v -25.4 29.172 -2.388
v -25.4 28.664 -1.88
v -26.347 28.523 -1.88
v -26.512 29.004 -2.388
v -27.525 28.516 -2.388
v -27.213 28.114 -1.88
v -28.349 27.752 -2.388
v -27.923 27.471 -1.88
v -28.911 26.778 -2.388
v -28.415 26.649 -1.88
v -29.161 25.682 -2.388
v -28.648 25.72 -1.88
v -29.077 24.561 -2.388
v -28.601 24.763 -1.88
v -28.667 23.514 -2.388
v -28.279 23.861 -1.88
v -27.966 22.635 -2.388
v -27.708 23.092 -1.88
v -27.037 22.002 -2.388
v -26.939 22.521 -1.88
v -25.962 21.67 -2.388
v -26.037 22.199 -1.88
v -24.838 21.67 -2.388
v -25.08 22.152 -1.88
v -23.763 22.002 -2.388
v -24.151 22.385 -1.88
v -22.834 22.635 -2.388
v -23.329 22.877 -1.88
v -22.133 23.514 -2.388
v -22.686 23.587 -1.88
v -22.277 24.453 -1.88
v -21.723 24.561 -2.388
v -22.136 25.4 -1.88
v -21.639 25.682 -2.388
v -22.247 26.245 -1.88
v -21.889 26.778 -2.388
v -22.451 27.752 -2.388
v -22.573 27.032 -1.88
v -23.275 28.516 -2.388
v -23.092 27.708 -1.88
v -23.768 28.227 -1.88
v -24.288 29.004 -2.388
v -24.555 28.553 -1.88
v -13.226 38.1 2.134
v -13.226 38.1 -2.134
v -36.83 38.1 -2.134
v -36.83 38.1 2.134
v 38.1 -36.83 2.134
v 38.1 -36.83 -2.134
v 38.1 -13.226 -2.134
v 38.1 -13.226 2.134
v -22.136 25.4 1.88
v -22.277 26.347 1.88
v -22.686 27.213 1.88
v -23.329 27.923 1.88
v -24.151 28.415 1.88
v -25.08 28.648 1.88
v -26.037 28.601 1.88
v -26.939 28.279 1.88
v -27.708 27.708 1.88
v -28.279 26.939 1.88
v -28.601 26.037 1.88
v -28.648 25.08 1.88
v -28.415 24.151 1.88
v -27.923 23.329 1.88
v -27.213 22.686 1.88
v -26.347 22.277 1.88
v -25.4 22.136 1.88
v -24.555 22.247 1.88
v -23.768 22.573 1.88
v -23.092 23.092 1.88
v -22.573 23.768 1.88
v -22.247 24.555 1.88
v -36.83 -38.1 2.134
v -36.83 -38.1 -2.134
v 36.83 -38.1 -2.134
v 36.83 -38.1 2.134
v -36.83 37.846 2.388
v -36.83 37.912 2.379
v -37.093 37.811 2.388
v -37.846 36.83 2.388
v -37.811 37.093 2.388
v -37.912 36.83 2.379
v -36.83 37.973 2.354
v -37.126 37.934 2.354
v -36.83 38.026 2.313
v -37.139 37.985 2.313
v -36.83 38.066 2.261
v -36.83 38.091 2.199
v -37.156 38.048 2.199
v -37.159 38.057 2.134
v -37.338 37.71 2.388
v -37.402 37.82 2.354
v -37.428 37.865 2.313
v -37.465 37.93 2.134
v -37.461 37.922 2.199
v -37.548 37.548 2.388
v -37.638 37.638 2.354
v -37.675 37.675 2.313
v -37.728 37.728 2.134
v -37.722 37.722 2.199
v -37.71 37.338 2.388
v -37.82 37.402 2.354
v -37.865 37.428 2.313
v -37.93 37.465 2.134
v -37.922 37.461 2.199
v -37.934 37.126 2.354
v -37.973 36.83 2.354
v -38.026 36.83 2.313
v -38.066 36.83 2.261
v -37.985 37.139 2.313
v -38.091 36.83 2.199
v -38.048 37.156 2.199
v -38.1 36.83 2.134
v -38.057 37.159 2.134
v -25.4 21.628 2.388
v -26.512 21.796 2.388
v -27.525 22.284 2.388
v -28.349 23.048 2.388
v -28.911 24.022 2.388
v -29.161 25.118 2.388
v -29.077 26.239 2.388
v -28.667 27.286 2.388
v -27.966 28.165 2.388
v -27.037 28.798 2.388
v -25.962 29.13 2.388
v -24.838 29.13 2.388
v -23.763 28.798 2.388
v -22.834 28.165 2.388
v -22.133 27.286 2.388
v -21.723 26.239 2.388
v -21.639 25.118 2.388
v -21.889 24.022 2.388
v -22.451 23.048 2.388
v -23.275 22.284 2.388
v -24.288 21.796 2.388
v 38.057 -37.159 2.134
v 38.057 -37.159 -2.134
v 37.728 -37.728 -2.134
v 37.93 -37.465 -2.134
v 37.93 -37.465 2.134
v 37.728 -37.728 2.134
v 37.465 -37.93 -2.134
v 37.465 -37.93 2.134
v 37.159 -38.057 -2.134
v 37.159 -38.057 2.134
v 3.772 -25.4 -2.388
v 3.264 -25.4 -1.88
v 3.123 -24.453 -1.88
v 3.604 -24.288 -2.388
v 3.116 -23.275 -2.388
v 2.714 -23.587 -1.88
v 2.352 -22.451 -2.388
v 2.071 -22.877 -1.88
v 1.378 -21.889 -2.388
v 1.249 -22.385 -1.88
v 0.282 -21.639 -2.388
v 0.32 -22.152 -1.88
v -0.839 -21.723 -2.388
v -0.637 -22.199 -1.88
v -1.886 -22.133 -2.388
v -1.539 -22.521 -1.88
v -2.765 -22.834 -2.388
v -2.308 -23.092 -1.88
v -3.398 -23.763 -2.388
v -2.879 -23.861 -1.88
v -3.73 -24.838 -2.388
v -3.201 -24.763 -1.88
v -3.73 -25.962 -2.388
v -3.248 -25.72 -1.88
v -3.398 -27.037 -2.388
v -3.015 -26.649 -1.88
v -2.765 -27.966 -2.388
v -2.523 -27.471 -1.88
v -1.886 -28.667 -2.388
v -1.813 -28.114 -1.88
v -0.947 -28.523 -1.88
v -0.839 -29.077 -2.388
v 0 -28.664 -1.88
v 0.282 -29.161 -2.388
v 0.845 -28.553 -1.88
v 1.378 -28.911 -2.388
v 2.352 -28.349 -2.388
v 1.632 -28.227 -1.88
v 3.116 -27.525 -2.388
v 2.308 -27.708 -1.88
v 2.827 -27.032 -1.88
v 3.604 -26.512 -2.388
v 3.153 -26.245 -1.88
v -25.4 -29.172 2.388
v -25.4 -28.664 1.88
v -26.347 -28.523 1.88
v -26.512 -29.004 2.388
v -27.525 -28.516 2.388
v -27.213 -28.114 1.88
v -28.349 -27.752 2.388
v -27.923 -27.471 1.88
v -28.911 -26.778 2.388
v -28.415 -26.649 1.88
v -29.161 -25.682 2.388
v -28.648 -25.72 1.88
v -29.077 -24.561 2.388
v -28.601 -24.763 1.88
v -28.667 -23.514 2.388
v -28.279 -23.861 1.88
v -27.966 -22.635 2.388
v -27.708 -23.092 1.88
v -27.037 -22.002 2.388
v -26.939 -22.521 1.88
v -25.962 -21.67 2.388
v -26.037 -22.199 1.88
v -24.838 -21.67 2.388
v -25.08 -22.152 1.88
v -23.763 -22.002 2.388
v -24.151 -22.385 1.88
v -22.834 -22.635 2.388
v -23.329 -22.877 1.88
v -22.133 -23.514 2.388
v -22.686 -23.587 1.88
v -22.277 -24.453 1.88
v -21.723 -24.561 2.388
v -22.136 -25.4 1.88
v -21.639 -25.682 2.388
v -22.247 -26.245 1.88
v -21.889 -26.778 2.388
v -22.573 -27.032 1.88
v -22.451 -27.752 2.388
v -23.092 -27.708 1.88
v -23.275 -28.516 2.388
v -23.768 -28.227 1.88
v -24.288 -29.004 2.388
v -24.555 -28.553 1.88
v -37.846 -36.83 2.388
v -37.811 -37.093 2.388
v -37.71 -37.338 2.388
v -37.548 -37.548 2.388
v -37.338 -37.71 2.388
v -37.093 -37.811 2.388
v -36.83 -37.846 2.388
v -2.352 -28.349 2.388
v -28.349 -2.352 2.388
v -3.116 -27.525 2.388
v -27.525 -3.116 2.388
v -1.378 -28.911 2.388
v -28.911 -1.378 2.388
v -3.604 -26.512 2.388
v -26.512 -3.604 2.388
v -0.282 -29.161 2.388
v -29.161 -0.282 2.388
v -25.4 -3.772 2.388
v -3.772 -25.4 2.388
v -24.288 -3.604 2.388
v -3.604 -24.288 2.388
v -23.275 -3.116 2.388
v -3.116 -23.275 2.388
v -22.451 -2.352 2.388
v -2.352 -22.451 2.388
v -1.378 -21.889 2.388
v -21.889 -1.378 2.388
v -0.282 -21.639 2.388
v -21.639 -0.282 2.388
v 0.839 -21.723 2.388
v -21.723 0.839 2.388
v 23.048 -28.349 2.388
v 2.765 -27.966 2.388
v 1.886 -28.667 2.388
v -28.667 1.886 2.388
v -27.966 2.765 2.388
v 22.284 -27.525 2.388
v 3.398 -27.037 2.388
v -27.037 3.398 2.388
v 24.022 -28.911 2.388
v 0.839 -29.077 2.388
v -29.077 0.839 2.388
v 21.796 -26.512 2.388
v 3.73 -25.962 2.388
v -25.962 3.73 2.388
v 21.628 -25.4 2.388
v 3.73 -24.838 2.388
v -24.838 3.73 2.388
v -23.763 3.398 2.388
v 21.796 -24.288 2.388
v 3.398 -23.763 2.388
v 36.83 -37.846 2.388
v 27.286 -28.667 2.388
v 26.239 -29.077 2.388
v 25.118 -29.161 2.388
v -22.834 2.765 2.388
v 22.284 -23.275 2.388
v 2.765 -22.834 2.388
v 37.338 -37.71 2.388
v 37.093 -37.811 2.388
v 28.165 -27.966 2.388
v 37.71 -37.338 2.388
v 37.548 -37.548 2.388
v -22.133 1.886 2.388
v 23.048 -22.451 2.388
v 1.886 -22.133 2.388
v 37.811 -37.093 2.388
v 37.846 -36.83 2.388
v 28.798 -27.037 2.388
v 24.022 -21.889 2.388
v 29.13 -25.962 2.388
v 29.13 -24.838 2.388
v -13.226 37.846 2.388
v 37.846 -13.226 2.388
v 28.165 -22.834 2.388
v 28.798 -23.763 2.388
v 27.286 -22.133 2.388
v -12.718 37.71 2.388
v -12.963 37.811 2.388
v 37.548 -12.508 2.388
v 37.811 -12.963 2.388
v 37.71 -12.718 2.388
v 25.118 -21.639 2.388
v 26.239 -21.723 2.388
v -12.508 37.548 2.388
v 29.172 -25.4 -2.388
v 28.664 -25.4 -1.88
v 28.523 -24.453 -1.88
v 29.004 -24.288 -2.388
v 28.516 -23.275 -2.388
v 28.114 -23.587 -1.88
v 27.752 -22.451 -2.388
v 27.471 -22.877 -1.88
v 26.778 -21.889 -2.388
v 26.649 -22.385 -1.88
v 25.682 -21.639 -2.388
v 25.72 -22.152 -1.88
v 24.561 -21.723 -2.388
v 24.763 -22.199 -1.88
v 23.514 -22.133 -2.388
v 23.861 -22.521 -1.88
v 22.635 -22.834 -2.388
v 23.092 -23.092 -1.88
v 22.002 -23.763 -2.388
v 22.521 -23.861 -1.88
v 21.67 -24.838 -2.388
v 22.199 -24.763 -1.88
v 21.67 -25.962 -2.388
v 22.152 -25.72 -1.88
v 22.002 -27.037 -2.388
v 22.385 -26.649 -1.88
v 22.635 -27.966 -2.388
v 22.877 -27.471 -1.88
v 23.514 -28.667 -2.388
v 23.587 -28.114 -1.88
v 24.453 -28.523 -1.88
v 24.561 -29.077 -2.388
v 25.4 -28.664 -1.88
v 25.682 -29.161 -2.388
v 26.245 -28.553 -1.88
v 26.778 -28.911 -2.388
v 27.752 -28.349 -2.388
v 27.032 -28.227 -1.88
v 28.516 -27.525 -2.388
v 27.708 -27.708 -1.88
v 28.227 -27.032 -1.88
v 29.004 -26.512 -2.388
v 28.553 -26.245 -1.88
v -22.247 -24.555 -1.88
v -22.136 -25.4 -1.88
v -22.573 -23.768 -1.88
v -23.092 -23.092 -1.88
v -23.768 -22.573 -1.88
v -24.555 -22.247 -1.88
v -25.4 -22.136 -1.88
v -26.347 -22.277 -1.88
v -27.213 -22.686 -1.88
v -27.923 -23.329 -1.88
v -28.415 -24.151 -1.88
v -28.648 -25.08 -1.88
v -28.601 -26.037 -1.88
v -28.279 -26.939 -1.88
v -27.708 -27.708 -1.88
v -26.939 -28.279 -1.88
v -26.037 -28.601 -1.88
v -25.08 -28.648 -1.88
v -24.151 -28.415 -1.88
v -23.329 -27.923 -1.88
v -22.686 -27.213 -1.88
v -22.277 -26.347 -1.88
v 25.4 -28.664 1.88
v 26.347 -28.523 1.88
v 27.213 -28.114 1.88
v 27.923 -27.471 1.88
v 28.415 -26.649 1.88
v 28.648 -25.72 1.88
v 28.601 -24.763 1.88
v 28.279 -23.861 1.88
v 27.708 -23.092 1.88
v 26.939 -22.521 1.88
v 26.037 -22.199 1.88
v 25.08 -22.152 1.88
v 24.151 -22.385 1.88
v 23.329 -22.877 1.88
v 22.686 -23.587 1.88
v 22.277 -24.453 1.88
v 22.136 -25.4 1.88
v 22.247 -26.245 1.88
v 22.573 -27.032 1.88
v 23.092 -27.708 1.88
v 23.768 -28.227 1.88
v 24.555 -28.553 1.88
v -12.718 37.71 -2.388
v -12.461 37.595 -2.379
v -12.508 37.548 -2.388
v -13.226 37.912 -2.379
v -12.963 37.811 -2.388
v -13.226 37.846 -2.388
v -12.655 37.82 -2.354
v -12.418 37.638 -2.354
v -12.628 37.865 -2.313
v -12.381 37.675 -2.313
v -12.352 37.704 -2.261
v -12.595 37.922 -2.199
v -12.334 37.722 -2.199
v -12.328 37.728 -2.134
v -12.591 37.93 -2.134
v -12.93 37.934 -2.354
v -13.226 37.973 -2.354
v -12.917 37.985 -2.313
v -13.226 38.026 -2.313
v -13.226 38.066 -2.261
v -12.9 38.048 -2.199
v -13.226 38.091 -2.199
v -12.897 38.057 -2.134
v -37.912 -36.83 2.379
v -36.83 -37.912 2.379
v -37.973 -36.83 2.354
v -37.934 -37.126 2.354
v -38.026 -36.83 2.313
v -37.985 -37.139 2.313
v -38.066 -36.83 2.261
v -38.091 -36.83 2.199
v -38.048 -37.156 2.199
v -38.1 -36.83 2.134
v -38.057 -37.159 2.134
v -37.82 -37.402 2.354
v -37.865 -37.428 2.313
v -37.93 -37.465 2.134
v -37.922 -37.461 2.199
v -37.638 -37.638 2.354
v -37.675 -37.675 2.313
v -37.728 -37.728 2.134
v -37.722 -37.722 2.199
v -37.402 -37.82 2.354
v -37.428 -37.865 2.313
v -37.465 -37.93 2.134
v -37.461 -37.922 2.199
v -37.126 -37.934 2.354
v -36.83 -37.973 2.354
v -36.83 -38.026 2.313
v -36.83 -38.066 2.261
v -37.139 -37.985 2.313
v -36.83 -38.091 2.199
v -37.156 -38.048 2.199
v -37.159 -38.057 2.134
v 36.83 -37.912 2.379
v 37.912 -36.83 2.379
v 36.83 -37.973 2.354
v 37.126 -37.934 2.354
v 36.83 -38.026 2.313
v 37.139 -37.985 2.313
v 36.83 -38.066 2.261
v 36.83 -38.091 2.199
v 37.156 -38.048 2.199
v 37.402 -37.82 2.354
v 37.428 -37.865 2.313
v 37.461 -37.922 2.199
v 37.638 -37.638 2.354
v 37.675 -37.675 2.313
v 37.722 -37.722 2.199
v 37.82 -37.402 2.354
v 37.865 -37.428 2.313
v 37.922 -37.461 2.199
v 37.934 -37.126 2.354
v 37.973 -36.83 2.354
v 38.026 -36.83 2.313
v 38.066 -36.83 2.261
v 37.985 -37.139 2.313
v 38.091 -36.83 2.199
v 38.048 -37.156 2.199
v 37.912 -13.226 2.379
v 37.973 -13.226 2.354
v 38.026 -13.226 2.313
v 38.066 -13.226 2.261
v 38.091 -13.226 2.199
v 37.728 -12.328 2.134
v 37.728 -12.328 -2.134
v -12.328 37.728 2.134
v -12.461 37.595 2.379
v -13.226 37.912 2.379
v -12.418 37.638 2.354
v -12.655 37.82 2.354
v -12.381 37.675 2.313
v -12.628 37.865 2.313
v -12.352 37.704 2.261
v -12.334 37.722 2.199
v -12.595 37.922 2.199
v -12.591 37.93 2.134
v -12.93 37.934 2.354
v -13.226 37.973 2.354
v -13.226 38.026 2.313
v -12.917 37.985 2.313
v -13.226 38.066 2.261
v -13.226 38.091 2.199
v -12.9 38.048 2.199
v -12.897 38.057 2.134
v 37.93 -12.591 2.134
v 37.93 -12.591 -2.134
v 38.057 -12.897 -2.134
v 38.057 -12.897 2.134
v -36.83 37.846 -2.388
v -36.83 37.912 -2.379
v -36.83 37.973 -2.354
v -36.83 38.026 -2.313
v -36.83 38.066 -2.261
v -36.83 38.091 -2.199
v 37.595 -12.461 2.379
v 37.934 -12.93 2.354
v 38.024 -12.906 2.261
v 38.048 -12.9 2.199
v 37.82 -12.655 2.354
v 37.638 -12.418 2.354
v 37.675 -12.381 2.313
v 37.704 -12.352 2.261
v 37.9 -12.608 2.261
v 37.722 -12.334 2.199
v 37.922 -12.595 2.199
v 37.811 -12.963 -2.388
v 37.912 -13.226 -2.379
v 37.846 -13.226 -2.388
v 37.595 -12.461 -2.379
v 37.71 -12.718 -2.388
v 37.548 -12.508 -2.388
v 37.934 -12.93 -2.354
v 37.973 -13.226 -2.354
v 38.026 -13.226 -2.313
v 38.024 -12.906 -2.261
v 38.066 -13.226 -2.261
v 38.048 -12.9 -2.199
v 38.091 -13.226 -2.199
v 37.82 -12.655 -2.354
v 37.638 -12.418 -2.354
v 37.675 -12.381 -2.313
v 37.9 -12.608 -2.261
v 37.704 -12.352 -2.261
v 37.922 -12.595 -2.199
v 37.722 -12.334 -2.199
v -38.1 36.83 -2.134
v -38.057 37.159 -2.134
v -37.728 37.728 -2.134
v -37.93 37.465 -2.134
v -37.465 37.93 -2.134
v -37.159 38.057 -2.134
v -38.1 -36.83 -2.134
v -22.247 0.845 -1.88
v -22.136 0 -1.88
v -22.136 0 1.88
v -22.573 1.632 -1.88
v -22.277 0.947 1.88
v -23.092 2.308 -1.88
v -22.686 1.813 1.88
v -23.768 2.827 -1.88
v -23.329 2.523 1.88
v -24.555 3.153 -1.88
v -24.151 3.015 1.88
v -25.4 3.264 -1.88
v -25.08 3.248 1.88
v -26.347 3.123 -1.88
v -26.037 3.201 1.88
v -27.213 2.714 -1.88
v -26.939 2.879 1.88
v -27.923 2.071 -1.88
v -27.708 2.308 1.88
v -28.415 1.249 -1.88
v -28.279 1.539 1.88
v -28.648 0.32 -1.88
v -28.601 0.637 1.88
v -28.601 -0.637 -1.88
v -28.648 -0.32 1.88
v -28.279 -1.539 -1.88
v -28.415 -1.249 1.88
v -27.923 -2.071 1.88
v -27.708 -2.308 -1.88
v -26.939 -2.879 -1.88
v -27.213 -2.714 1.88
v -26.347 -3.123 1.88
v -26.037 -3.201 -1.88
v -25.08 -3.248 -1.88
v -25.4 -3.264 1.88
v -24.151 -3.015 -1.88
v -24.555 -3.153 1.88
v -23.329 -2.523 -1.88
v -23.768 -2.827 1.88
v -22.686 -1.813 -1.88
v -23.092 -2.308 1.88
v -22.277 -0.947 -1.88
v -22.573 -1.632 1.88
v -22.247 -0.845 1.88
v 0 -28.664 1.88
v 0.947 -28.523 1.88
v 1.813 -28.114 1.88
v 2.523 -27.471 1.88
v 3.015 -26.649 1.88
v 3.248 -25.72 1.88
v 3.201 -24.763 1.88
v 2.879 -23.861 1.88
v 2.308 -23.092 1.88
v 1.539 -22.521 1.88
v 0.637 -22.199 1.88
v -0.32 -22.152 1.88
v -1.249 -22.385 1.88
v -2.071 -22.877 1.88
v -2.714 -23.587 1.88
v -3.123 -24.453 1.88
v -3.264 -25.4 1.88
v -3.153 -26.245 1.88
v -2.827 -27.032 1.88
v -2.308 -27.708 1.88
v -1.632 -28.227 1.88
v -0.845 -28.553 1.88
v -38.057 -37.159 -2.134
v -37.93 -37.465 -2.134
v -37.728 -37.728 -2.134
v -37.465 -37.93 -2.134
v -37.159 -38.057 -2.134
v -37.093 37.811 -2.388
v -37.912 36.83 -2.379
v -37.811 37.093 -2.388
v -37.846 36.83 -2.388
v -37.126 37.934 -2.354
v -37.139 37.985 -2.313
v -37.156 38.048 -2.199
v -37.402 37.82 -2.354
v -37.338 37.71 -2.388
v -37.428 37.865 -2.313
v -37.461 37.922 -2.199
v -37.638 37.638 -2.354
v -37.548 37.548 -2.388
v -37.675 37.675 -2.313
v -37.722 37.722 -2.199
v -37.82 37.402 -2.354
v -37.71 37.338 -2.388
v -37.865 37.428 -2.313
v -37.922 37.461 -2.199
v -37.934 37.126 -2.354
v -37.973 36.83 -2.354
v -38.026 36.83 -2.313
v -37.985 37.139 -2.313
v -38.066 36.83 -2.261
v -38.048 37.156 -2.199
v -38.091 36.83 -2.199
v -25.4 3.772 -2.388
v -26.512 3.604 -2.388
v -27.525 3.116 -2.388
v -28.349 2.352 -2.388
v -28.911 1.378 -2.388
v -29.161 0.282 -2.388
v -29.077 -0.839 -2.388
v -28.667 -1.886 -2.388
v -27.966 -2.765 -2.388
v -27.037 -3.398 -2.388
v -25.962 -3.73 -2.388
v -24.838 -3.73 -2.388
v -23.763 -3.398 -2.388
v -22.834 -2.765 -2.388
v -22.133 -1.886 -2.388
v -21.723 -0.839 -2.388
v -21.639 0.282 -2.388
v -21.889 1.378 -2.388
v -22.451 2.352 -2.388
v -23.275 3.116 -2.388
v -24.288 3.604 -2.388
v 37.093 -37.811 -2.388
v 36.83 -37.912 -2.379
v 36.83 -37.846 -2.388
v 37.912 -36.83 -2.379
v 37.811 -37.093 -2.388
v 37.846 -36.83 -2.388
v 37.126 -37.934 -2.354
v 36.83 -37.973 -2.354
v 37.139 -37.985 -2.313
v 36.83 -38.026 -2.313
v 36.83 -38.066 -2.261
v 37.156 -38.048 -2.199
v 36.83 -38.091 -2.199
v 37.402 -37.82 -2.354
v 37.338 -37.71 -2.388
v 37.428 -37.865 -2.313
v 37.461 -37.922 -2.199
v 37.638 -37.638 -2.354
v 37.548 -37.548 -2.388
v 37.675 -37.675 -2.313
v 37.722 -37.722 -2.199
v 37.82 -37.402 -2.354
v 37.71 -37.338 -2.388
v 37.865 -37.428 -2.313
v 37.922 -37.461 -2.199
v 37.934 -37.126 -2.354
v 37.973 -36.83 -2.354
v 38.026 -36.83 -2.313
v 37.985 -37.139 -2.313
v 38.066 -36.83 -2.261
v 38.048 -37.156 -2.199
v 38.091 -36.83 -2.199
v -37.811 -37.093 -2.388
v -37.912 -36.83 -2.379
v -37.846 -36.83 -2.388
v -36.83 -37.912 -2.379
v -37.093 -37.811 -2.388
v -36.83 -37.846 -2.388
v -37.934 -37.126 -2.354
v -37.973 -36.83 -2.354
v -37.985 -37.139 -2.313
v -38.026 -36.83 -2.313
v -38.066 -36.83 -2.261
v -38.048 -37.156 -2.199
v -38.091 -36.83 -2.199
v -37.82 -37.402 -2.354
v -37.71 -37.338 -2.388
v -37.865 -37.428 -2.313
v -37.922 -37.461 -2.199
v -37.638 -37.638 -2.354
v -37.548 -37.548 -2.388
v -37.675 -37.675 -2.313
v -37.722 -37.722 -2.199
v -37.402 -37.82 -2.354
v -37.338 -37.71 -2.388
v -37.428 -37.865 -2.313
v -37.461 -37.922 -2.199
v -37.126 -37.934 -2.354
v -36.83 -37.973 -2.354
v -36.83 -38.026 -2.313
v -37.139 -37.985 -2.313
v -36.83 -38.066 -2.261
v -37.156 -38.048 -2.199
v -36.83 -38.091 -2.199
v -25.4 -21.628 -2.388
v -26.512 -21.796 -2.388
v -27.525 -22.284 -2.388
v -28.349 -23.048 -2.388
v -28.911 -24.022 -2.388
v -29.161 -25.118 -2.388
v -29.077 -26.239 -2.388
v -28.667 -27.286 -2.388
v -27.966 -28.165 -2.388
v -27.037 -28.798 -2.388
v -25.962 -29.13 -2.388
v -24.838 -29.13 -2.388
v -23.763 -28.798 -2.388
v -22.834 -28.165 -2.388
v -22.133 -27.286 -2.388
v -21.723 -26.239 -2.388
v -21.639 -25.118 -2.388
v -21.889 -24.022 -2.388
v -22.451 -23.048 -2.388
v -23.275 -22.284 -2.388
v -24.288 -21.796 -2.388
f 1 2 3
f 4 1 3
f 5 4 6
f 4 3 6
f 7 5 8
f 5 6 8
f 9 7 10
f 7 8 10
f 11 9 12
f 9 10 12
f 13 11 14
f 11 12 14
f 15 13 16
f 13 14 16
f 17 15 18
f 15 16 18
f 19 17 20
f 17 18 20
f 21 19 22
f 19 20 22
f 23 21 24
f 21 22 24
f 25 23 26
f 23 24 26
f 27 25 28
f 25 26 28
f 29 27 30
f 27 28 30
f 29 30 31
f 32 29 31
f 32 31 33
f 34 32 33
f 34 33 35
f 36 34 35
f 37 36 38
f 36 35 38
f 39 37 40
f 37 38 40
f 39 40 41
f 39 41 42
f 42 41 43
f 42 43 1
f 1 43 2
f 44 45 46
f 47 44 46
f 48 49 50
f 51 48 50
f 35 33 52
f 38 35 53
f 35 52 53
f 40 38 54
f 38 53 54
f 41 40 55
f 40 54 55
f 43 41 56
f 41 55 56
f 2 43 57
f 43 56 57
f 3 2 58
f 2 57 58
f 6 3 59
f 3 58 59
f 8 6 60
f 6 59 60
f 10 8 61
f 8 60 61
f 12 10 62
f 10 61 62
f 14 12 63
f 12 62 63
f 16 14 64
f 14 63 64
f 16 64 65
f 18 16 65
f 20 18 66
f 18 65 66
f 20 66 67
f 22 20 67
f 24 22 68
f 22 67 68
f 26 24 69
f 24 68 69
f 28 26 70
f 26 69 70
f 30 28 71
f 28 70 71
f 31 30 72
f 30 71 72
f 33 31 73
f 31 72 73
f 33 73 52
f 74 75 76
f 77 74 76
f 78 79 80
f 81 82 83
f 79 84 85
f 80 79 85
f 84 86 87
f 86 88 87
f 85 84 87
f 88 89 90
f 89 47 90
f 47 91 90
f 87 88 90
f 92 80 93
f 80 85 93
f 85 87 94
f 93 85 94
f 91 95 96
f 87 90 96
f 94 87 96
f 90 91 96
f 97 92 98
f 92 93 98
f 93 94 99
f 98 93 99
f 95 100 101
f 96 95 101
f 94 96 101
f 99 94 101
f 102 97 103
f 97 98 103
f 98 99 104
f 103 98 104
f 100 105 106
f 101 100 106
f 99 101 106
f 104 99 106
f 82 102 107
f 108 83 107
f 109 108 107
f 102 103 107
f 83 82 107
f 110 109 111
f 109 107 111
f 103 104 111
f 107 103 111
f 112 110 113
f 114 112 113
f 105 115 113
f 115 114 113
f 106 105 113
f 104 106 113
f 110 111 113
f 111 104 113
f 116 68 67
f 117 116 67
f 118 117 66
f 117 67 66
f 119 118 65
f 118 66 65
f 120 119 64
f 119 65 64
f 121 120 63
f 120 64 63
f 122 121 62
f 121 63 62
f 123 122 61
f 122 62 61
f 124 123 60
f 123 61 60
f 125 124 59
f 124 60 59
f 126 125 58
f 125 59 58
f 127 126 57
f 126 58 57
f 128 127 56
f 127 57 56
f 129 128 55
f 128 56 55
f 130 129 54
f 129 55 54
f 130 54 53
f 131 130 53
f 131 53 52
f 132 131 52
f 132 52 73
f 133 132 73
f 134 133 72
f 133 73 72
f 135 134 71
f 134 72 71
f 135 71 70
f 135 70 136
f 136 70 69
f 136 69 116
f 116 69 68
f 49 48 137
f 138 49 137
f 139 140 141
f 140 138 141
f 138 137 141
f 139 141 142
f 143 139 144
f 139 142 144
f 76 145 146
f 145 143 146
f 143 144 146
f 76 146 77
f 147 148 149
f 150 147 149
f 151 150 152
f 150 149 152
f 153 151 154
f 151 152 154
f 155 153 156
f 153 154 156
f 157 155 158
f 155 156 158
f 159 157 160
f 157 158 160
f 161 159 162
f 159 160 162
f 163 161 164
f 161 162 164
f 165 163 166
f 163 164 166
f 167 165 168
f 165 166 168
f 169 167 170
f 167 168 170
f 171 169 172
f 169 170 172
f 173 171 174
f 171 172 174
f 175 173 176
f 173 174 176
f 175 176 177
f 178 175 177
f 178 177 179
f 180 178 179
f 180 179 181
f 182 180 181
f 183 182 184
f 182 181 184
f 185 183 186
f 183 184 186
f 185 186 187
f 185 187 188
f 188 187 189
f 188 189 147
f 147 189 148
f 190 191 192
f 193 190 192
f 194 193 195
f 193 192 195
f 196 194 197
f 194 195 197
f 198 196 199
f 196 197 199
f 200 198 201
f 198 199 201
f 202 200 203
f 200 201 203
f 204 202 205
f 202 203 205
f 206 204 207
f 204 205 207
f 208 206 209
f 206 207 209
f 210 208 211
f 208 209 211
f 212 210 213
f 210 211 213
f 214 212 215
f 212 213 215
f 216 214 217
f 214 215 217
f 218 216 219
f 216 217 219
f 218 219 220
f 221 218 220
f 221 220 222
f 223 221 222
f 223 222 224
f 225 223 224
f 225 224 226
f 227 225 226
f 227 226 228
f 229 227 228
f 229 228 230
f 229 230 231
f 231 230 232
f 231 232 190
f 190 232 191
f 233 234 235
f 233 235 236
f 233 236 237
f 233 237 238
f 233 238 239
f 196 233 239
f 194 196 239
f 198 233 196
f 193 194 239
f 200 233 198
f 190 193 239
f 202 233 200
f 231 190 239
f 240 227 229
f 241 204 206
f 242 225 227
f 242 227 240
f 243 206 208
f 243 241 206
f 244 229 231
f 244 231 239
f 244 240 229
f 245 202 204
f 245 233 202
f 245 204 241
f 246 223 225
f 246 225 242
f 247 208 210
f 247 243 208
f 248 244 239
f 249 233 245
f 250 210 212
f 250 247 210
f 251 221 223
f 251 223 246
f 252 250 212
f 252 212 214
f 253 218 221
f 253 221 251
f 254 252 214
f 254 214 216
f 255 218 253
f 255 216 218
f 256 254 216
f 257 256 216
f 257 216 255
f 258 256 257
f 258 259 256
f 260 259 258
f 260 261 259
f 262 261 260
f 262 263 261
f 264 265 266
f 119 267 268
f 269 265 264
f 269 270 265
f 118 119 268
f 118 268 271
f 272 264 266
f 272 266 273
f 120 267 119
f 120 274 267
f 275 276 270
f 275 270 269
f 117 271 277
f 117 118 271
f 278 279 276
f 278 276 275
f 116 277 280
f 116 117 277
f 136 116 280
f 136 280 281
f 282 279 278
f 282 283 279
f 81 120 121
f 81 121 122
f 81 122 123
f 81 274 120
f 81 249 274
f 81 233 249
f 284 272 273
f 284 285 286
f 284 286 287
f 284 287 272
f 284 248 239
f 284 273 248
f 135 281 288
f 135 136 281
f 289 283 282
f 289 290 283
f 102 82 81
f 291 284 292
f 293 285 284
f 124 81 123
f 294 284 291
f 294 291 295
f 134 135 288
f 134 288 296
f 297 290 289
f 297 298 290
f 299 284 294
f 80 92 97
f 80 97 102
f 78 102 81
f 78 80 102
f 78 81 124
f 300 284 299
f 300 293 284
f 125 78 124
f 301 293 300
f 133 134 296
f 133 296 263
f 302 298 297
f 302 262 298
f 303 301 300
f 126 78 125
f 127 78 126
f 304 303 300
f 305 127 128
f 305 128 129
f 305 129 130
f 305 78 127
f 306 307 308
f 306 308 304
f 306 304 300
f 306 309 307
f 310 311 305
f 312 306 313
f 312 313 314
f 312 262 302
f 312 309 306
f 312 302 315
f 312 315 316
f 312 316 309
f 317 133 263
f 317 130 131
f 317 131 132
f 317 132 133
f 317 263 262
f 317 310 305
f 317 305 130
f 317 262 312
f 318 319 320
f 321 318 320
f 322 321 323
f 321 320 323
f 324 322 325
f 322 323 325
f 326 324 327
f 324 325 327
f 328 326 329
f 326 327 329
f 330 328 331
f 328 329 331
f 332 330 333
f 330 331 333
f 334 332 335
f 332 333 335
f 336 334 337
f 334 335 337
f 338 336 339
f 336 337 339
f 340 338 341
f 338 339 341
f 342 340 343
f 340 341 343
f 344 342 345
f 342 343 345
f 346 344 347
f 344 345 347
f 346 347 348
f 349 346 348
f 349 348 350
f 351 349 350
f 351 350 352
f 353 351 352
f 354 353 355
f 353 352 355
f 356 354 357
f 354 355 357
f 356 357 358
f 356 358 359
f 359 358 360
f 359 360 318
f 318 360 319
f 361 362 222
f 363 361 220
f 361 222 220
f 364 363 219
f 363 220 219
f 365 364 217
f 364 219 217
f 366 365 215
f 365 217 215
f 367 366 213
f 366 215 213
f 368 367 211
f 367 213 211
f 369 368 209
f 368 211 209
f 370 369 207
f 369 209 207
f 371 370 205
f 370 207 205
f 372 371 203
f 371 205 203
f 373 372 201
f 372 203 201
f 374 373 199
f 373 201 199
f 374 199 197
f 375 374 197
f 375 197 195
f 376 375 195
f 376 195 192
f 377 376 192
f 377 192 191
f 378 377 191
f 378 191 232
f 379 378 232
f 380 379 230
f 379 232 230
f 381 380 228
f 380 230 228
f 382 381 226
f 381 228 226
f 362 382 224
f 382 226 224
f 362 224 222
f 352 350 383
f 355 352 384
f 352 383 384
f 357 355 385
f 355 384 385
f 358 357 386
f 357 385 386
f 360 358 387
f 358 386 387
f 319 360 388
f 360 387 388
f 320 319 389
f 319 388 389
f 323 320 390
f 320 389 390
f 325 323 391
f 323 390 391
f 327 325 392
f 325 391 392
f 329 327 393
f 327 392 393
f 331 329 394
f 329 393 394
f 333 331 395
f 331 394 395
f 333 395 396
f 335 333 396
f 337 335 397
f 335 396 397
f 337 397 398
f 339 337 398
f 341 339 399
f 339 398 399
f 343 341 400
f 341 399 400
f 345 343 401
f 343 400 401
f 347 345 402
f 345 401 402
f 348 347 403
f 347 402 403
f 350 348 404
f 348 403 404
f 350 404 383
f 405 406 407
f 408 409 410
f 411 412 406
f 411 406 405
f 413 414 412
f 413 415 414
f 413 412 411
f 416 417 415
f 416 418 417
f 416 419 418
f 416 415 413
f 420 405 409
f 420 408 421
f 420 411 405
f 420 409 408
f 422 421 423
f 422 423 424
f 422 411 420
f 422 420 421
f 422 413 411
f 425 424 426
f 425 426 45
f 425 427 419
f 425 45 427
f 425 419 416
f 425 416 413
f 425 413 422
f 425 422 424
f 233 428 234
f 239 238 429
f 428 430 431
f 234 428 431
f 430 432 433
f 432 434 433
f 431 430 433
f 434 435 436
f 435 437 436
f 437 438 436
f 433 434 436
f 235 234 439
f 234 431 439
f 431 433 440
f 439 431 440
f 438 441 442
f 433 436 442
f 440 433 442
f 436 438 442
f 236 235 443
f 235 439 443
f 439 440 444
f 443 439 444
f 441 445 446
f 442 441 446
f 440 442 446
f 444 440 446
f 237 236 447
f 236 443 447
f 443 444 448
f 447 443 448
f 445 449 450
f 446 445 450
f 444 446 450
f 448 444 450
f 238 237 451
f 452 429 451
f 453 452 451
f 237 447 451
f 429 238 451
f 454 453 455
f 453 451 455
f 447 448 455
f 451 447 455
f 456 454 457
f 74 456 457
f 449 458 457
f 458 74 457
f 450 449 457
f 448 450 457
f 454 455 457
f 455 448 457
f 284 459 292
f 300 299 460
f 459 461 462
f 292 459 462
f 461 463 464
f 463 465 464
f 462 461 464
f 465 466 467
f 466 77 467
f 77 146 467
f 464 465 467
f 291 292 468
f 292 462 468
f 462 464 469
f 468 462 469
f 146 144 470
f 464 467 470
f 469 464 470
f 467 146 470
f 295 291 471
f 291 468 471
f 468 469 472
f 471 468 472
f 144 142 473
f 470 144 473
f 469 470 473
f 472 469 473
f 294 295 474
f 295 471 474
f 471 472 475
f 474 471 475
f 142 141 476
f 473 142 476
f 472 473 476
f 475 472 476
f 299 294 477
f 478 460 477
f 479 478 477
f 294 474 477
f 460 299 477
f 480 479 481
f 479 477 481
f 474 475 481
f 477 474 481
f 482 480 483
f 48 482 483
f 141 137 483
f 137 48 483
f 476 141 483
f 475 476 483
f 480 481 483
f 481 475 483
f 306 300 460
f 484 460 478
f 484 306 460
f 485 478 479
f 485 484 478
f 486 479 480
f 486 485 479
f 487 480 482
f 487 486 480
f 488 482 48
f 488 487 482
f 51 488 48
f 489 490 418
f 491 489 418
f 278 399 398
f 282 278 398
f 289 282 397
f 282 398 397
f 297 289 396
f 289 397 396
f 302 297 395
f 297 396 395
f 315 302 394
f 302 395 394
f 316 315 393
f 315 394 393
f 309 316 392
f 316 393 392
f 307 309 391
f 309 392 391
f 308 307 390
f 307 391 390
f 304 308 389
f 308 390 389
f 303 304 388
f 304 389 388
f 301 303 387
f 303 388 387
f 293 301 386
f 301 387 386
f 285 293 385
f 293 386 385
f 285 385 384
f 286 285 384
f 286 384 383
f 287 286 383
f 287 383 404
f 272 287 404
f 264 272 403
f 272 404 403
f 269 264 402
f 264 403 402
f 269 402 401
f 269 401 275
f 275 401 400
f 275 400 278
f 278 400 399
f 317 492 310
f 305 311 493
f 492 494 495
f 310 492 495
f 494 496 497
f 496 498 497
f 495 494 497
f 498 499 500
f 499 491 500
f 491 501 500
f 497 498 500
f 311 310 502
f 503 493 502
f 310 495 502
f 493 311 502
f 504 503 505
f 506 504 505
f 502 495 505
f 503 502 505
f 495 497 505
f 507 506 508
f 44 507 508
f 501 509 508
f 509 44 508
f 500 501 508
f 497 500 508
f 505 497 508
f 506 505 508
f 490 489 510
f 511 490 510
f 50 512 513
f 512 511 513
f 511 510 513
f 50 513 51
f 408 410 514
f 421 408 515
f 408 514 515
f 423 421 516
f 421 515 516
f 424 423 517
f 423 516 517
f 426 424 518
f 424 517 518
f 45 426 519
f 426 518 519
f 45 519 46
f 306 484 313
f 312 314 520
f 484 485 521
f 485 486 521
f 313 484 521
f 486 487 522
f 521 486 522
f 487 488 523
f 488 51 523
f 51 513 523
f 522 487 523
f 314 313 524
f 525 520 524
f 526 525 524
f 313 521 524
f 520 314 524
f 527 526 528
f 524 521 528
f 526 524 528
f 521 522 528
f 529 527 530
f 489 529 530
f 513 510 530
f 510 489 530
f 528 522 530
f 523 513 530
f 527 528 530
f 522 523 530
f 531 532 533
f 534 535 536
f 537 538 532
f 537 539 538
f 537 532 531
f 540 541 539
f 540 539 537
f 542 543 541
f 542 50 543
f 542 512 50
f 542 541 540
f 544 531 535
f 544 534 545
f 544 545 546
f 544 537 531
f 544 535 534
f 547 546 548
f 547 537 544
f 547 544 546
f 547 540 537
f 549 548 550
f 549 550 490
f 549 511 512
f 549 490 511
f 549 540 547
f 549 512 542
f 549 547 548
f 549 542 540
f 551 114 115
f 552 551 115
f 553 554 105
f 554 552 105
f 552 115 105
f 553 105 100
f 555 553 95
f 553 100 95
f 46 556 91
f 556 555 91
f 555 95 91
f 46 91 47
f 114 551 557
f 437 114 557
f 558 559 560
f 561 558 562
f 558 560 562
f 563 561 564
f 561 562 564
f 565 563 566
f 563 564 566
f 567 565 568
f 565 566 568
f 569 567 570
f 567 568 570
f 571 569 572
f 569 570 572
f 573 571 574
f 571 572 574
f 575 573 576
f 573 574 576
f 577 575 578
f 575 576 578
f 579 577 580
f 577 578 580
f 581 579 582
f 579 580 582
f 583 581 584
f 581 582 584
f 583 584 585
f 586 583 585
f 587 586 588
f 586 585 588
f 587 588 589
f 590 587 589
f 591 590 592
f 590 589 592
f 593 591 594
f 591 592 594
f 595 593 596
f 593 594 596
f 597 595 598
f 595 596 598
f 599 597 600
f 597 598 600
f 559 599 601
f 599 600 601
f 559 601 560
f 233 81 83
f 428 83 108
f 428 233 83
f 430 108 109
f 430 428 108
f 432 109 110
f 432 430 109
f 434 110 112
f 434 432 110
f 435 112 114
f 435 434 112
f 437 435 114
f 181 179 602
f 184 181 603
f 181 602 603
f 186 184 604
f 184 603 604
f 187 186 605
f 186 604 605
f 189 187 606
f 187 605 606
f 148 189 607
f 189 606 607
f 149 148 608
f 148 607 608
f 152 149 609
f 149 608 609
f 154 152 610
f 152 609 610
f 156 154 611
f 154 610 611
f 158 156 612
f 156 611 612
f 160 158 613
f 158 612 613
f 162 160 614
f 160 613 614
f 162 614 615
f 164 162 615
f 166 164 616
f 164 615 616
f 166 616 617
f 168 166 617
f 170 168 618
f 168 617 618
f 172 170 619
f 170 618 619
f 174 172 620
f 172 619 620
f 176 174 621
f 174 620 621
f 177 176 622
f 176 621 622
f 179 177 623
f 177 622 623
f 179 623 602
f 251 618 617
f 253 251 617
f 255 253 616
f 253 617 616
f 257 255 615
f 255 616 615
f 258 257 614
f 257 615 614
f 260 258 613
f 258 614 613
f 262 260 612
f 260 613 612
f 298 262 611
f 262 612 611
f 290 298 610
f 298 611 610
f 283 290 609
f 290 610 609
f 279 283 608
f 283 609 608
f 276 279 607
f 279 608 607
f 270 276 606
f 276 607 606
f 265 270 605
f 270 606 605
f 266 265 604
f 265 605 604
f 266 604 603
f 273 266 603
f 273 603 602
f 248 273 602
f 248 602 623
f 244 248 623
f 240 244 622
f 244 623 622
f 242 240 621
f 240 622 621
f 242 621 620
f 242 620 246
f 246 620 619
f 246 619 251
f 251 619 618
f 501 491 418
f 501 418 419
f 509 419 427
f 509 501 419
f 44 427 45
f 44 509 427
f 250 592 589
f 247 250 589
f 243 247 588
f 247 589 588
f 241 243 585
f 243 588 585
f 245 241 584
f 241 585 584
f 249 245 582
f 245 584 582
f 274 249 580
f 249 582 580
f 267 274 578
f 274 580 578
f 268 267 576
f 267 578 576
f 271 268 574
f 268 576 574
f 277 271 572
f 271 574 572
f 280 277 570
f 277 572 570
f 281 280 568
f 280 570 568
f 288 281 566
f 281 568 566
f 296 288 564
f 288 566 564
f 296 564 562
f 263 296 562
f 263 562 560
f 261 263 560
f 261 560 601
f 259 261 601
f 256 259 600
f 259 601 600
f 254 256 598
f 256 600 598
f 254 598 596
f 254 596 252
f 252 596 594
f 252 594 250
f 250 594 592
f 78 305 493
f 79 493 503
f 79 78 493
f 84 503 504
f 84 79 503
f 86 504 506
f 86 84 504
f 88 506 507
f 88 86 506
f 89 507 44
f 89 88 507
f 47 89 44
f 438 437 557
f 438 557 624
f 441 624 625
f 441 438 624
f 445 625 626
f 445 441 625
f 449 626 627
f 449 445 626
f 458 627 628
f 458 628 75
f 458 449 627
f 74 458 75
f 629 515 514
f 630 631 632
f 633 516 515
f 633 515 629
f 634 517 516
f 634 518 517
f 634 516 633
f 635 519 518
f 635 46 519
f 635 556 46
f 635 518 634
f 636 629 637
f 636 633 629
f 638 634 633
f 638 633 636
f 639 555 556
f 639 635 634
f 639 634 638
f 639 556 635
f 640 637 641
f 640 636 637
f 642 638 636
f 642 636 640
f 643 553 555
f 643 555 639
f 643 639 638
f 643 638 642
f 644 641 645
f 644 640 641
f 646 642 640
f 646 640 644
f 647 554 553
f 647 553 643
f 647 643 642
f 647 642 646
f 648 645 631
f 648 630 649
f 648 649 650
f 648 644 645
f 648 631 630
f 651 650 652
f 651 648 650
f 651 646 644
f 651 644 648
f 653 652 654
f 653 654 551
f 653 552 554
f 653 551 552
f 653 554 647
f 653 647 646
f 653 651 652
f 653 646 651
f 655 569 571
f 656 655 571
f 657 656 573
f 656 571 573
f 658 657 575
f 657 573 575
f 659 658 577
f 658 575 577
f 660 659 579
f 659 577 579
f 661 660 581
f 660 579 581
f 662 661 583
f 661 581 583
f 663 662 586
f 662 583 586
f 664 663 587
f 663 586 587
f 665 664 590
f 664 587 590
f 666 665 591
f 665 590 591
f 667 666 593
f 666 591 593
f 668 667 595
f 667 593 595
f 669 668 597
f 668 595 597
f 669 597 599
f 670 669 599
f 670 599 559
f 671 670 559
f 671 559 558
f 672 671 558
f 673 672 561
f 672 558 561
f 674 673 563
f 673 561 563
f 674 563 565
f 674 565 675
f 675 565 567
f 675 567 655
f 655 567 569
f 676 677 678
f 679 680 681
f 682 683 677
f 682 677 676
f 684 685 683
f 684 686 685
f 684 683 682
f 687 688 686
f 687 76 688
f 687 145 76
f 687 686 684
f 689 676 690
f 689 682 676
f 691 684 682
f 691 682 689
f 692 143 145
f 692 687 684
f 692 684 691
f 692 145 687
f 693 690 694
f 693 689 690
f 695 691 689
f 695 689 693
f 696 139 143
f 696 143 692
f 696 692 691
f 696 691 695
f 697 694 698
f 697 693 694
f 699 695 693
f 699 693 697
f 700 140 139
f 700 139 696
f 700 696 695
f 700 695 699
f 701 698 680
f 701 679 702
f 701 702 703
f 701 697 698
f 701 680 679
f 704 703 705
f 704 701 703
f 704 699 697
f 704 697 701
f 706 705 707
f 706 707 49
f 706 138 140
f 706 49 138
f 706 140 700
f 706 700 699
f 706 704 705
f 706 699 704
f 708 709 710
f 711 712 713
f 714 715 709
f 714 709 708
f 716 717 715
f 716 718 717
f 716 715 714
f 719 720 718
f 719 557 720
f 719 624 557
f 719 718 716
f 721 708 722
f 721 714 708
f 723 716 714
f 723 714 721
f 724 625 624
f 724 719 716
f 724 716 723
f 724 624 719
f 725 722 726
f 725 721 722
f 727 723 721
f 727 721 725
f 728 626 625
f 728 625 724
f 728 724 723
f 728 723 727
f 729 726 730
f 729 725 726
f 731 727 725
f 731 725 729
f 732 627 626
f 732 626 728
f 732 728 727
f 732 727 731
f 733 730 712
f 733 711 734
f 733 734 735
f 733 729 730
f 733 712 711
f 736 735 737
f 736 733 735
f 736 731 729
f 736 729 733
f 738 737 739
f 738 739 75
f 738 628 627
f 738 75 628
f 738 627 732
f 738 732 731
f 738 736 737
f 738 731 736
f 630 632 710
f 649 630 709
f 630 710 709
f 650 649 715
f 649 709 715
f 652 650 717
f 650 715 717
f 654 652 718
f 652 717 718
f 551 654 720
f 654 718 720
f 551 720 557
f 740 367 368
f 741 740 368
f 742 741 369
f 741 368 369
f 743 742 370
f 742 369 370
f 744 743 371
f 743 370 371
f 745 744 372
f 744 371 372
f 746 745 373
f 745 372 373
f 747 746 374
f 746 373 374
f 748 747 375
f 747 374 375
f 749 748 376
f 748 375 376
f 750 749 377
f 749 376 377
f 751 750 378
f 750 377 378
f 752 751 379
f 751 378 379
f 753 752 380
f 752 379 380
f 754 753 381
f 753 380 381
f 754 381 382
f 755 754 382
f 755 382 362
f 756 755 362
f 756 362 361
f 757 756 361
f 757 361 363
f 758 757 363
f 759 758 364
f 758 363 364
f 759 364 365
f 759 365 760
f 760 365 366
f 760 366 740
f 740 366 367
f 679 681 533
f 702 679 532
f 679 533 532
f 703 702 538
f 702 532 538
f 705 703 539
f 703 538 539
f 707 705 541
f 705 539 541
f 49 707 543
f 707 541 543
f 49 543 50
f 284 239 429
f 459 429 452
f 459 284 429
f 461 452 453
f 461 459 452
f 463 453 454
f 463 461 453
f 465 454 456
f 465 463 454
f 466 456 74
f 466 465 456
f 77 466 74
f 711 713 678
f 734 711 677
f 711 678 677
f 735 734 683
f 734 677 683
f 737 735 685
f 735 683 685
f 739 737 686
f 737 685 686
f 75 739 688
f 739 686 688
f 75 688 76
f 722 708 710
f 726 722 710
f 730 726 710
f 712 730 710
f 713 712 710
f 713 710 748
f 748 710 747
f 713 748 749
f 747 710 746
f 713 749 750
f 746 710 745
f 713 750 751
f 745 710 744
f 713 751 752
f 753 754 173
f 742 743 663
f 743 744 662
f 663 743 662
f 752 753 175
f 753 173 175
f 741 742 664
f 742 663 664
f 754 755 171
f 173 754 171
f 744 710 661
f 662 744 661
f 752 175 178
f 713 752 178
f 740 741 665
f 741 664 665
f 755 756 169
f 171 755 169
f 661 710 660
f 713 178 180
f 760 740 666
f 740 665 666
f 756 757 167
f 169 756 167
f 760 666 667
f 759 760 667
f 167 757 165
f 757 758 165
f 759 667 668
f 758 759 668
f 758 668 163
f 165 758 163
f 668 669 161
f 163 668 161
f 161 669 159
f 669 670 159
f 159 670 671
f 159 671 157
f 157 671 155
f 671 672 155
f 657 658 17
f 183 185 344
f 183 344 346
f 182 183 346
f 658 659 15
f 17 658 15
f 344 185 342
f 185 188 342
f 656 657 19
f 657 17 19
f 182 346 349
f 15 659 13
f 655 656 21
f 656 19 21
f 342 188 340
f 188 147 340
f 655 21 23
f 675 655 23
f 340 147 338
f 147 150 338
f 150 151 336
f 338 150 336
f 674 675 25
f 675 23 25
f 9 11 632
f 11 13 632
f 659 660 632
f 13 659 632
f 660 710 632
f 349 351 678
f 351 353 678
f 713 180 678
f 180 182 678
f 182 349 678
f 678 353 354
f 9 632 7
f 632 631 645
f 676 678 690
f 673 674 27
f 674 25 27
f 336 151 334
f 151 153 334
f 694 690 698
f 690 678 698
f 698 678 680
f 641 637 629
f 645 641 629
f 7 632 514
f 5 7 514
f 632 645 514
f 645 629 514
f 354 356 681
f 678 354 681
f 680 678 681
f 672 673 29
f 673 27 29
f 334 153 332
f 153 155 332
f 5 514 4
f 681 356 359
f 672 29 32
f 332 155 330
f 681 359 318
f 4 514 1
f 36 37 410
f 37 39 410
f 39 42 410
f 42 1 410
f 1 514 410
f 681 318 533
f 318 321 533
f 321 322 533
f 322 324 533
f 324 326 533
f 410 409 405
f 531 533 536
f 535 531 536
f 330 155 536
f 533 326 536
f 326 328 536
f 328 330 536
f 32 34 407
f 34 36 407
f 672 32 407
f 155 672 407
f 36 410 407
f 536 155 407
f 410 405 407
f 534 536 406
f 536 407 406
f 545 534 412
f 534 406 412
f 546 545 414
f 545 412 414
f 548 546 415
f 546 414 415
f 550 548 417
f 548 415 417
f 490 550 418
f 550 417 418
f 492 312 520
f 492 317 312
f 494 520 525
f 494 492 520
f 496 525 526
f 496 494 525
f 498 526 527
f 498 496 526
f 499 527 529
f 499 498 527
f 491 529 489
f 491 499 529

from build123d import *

# Parameters (mm, degrees)
BOSS_EXTRUDE1_START         = -2.3876
BOSS_EXTRUDE1_DEPTH         = 4.7752
SKETCH4_R                   = 3.2639
CUT_EXTRUDE1_DEPTH          = 55.092721646
LPATTERN1_COUNT             = 3
LPATTERN1_PITCH             = 25.4
CIRPATTERN1_COPY_1_SKETCH_R = 3.2639
CIRPATTERN1_COPY_1_DEPTH    = 55.092721646
CIRPATTERN1_COPY_2_SKETCH_R = 3.2639
CIRPATTERN1_COPY_2_DEPTH    = 55.092721646
CIRPATTERN1_COPY_7_SKETCH_R = 3.2639
CIRPATTERN1_COPY_7_DEPTH    = 55.092721646
FILLET1_R                   = 1.27
FILLET2_R                   = 0.254


with BuildPart() as part:
    # Sketch3 → Boss-Extrude1 (new body)
    with BuildSketch(Plane.XY.offset(BOSS_EXTRUDE1_START)):
        Polygon((-38.1, 38.1), (-38.1, -38.1), (38.1, -38.1), (38.1, -12.7), (-12.7, 38.1), align=None)
    extrude(amount=BOSS_EXTRUDE1_DEPTH)

    # Sketch4 → Cut-Extrude1 (cut, symmetric)
    with BuildSketch(Plane.XY.offset(2.3876)):
        with Locations((-25.4, -25.4)):
            Circle(SKETCH4_R)
    cut_extrude1 = extrude(amount=CUT_EXTRUDE1_DEPTH, both=True, mode=Mode.SUBTRACT)

    # Cut-Extrude2 cone 1 section (through the dimple's axis) → Cut-Extrude2 (revolve, cut)
    with BuildSketch(Plane(origin=(-25.4, -25.4, 2.3876), x_dir=(0, -1, 0), z_dir=(1, 0, 0))):
        Polygon((0, 0), (3.7719, 0), (0, 3.7719), align=None)
    cut_extrude2 = revolve(axis=Axis((-25.4, -25.4, 2.3876), (0, 0, -1)), mode=Mode.SUBTRACT)

    # Cut-Extrude3 cone 1 section (through the dimple's axis) → Cut-Extrude3 (revolve, cut)
    with BuildSketch(Plane(origin=(-25.4, -25.4, -2.3876), x_dir=(0, 1, 0), z_dir=(1, 0, 0))):
        Polygon((0, 0), (3.7719, 0), (0, 3.7719), align=None)
    cut_extrude3 = revolve(axis=Axis((-25.4, -25.4, -2.3876), (0, 0, 1)), mode=Mode.SUBTRACT)

    # LPattern1: Cut-Extrude1, Cut-Extrude2, Cut-Extrude3 ×3
    with Locations(*[(0, i * LPATTERN1_PITCH, 0) for i in range(1, LPATTERN1_COUNT)]):
        add(cut_extrude1, mode=Mode.SUBTRACT)
        add(cut_extrude2, mode=Mode.SUBTRACT)
        add(cut_extrude3, mode=Mode.SUBTRACT)

    # CirPattern1 copy 1 sketch → CirPattern1 copy 1 (cut, symmetric)
    with BuildSketch(Plane(origin=(25.4, -50.8, 2.3876), x_dir=(0, -1, 0), z_dir=(0, 0, 1))):
        with Locations((-25.4, -25.4)):
            Circle(CIRPATTERN1_COPY_1_SKETCH_R)
    extrude(amount=CIRPATTERN1_COPY_1_DEPTH, both=True, mode=Mode.SUBTRACT)

    # CirPattern1 copy 2 sketch → CirPattern1 copy 2 (cut, symmetric)
    with BuildSketch(Plane(origin=(50.8, -50.8, 2.3876), x_dir=(0, -1, 0), z_dir=(0, 0, 1))):
        with Locations((-25.4, -25.4)):
            Circle(CIRPATTERN1_COPY_2_SKETCH_R)
    extrude(amount=CIRPATTERN1_COPY_2_DEPTH, both=True, mode=Mode.SUBTRACT)

    # CirPattern1 copy 3 sketch → CirPattern1 copy 3 (revolve, cut)
    with BuildSketch(Plane(origin=(0, -25.4, 2.3876), x_dir=(-1, 0, 0), z_dir=(0, -1, 0))):
        Polygon((0, 0), (3.7719, 0), (0, 3.7719), align=None)
    revolve(axis=Axis((0, -25.4, 2.3876), (0, 0, -1)), mode=Mode.SUBTRACT)

    # CirPattern1 copy 4 sketch → CirPattern1 copy 4 (revolve, cut)
    with BuildSketch(Plane(origin=(25.4, -25.4, 2.3876), x_dir=(-1, 0, 0), z_dir=(0, -1, 0))):
        Polygon((0, 0), (3.7719, 0), (0, 3.7719), align=None)
    revolve(axis=Axis((25.4, -25.4, 2.3876), (0, 0, -1)), mode=Mode.SUBTRACT)

    # CirPattern1 copy 5 sketch → CirPattern1 copy 5 (revolve, cut)
    with BuildSketch(Plane(origin=(0, -25.4, -2.3876), x_dir=(1, 0, 0), z_dir=(0, -1, 0))):
        Polygon((0, 0), (3.7719, 0), (0, 3.7719), align=None)
    revolve(axis=Axis((0, -25.4, -2.3876), (0, 0, 1)), mode=Mode.SUBTRACT)

    # CirPattern1 copy 6 sketch → CirPattern1 copy 6 (revolve, cut)
    with BuildSketch(Plane(origin=(25.4, -25.4, -2.3876), x_dir=(1, 0, 0), z_dir=(0, -1, 0))):
        Polygon((0, 0), (3.7719, 0), (0, 3.7719), align=None)
    revolve(axis=Axis((25.4, -25.4, -2.3876), (0, 0, 1)), mode=Mode.SUBTRACT)

    # CirPattern1 copy 7 sketch → CirPattern1 copy 7 (cut, symmetric)
    with BuildSketch(Plane(origin=(0, -50.8, 2.3876), x_dir=(0, -1, 0), z_dir=(0, 0, 1))):
        with Locations((-25.4, -25.4)):
            Circle(CIRPATTERN1_COPY_7_SKETCH_R)
    extrude(amount=CIRPATTERN1_COPY_7_DEPTH, both=True, mode=Mode.SUBTRACT)

    # CirPattern1 copy 8 sketch → CirPattern1 copy 8 (revolve, cut)
    with BuildSketch(Plane(origin=(-25.4, -25.4, 2.3876), x_dir=(-1, 0, 0), z_dir=(0, -1, 0))):
        Polygon((0, 0), (3.7719, 0), (0, 3.7719), align=None)
    revolve(axis=Axis((-25.4, -25.4, 2.3876), (0, 0, -1)), mode=Mode.SUBTRACT)

    # CirPattern1 copy 9 sketch → CirPattern1 copy 9 (revolve, cut)
    with BuildSketch(Plane(origin=(-25.4, -25.4, -2.3876), x_dir=(1, 0, 0), z_dir=(0, -1, 0))):
        Polygon((0, 0), (3.7719, 0), (0, 3.7719), align=None)
    revolve(axis=Axis((-25.4, -25.4, -2.3876), (0, 0, 1)), mode=Mode.SUBTRACT)

    # Fillet1
    fillet1_edges = [part.edges().sort_by_distance(p)[0] for p in [
        (-12.7, 38.1, 0),
        (38.1, -12.7, 0),
        (38.1, -38.1, 0),
        (-38.1, -38.1, 0),
        (-38.1, 38.1, 0),
    ]]
    fillet(fillet1_edges, radius=FILLET1_R)

    # Fillet2
    fillet2_edges = [part.edges().sort_by_distance(p)[0] for p in [
        (12.7, 12.7, -2.3876),
        (12.7, 12.7, 2.3876),
        (-25.028025612, 38.1, -2.3876),
        (38.1, -25.028025612, -2.3876),
        (0, -38.1, -2.3876),
        (-38.1, 0, -2.3876),
        (-12.740043265, 38.003327006, -2.3876),
        (-37.728025612, 37.728025612, -2.3876),
        (-37.728025612, -37.728025612, -2.3876),
        (37.728025612, -37.728025612, -2.3876),
        (38.003327006, -12.740043265, -2.3876),
        (38.1, -25.028025612, 2.3876),
        (-25.028025612, 38.1, 2.3876),
        (-38.1, 0, 2.3876),
        (0, -38.1, 2.3876),
        (-12.740043265, 38.003327006, 2.3876),
        (-37.728025612, 37.728025612, 2.3876),
        (-37.728025612, -37.728025612, 2.3876),
        (37.728025612, -37.728025612, 2.3876),
        (38.003327006, -12.740043265, 2.3876),
    ]]
    fillet(fillet2_edges, radius=FILLET2_R)


solid = part.part
